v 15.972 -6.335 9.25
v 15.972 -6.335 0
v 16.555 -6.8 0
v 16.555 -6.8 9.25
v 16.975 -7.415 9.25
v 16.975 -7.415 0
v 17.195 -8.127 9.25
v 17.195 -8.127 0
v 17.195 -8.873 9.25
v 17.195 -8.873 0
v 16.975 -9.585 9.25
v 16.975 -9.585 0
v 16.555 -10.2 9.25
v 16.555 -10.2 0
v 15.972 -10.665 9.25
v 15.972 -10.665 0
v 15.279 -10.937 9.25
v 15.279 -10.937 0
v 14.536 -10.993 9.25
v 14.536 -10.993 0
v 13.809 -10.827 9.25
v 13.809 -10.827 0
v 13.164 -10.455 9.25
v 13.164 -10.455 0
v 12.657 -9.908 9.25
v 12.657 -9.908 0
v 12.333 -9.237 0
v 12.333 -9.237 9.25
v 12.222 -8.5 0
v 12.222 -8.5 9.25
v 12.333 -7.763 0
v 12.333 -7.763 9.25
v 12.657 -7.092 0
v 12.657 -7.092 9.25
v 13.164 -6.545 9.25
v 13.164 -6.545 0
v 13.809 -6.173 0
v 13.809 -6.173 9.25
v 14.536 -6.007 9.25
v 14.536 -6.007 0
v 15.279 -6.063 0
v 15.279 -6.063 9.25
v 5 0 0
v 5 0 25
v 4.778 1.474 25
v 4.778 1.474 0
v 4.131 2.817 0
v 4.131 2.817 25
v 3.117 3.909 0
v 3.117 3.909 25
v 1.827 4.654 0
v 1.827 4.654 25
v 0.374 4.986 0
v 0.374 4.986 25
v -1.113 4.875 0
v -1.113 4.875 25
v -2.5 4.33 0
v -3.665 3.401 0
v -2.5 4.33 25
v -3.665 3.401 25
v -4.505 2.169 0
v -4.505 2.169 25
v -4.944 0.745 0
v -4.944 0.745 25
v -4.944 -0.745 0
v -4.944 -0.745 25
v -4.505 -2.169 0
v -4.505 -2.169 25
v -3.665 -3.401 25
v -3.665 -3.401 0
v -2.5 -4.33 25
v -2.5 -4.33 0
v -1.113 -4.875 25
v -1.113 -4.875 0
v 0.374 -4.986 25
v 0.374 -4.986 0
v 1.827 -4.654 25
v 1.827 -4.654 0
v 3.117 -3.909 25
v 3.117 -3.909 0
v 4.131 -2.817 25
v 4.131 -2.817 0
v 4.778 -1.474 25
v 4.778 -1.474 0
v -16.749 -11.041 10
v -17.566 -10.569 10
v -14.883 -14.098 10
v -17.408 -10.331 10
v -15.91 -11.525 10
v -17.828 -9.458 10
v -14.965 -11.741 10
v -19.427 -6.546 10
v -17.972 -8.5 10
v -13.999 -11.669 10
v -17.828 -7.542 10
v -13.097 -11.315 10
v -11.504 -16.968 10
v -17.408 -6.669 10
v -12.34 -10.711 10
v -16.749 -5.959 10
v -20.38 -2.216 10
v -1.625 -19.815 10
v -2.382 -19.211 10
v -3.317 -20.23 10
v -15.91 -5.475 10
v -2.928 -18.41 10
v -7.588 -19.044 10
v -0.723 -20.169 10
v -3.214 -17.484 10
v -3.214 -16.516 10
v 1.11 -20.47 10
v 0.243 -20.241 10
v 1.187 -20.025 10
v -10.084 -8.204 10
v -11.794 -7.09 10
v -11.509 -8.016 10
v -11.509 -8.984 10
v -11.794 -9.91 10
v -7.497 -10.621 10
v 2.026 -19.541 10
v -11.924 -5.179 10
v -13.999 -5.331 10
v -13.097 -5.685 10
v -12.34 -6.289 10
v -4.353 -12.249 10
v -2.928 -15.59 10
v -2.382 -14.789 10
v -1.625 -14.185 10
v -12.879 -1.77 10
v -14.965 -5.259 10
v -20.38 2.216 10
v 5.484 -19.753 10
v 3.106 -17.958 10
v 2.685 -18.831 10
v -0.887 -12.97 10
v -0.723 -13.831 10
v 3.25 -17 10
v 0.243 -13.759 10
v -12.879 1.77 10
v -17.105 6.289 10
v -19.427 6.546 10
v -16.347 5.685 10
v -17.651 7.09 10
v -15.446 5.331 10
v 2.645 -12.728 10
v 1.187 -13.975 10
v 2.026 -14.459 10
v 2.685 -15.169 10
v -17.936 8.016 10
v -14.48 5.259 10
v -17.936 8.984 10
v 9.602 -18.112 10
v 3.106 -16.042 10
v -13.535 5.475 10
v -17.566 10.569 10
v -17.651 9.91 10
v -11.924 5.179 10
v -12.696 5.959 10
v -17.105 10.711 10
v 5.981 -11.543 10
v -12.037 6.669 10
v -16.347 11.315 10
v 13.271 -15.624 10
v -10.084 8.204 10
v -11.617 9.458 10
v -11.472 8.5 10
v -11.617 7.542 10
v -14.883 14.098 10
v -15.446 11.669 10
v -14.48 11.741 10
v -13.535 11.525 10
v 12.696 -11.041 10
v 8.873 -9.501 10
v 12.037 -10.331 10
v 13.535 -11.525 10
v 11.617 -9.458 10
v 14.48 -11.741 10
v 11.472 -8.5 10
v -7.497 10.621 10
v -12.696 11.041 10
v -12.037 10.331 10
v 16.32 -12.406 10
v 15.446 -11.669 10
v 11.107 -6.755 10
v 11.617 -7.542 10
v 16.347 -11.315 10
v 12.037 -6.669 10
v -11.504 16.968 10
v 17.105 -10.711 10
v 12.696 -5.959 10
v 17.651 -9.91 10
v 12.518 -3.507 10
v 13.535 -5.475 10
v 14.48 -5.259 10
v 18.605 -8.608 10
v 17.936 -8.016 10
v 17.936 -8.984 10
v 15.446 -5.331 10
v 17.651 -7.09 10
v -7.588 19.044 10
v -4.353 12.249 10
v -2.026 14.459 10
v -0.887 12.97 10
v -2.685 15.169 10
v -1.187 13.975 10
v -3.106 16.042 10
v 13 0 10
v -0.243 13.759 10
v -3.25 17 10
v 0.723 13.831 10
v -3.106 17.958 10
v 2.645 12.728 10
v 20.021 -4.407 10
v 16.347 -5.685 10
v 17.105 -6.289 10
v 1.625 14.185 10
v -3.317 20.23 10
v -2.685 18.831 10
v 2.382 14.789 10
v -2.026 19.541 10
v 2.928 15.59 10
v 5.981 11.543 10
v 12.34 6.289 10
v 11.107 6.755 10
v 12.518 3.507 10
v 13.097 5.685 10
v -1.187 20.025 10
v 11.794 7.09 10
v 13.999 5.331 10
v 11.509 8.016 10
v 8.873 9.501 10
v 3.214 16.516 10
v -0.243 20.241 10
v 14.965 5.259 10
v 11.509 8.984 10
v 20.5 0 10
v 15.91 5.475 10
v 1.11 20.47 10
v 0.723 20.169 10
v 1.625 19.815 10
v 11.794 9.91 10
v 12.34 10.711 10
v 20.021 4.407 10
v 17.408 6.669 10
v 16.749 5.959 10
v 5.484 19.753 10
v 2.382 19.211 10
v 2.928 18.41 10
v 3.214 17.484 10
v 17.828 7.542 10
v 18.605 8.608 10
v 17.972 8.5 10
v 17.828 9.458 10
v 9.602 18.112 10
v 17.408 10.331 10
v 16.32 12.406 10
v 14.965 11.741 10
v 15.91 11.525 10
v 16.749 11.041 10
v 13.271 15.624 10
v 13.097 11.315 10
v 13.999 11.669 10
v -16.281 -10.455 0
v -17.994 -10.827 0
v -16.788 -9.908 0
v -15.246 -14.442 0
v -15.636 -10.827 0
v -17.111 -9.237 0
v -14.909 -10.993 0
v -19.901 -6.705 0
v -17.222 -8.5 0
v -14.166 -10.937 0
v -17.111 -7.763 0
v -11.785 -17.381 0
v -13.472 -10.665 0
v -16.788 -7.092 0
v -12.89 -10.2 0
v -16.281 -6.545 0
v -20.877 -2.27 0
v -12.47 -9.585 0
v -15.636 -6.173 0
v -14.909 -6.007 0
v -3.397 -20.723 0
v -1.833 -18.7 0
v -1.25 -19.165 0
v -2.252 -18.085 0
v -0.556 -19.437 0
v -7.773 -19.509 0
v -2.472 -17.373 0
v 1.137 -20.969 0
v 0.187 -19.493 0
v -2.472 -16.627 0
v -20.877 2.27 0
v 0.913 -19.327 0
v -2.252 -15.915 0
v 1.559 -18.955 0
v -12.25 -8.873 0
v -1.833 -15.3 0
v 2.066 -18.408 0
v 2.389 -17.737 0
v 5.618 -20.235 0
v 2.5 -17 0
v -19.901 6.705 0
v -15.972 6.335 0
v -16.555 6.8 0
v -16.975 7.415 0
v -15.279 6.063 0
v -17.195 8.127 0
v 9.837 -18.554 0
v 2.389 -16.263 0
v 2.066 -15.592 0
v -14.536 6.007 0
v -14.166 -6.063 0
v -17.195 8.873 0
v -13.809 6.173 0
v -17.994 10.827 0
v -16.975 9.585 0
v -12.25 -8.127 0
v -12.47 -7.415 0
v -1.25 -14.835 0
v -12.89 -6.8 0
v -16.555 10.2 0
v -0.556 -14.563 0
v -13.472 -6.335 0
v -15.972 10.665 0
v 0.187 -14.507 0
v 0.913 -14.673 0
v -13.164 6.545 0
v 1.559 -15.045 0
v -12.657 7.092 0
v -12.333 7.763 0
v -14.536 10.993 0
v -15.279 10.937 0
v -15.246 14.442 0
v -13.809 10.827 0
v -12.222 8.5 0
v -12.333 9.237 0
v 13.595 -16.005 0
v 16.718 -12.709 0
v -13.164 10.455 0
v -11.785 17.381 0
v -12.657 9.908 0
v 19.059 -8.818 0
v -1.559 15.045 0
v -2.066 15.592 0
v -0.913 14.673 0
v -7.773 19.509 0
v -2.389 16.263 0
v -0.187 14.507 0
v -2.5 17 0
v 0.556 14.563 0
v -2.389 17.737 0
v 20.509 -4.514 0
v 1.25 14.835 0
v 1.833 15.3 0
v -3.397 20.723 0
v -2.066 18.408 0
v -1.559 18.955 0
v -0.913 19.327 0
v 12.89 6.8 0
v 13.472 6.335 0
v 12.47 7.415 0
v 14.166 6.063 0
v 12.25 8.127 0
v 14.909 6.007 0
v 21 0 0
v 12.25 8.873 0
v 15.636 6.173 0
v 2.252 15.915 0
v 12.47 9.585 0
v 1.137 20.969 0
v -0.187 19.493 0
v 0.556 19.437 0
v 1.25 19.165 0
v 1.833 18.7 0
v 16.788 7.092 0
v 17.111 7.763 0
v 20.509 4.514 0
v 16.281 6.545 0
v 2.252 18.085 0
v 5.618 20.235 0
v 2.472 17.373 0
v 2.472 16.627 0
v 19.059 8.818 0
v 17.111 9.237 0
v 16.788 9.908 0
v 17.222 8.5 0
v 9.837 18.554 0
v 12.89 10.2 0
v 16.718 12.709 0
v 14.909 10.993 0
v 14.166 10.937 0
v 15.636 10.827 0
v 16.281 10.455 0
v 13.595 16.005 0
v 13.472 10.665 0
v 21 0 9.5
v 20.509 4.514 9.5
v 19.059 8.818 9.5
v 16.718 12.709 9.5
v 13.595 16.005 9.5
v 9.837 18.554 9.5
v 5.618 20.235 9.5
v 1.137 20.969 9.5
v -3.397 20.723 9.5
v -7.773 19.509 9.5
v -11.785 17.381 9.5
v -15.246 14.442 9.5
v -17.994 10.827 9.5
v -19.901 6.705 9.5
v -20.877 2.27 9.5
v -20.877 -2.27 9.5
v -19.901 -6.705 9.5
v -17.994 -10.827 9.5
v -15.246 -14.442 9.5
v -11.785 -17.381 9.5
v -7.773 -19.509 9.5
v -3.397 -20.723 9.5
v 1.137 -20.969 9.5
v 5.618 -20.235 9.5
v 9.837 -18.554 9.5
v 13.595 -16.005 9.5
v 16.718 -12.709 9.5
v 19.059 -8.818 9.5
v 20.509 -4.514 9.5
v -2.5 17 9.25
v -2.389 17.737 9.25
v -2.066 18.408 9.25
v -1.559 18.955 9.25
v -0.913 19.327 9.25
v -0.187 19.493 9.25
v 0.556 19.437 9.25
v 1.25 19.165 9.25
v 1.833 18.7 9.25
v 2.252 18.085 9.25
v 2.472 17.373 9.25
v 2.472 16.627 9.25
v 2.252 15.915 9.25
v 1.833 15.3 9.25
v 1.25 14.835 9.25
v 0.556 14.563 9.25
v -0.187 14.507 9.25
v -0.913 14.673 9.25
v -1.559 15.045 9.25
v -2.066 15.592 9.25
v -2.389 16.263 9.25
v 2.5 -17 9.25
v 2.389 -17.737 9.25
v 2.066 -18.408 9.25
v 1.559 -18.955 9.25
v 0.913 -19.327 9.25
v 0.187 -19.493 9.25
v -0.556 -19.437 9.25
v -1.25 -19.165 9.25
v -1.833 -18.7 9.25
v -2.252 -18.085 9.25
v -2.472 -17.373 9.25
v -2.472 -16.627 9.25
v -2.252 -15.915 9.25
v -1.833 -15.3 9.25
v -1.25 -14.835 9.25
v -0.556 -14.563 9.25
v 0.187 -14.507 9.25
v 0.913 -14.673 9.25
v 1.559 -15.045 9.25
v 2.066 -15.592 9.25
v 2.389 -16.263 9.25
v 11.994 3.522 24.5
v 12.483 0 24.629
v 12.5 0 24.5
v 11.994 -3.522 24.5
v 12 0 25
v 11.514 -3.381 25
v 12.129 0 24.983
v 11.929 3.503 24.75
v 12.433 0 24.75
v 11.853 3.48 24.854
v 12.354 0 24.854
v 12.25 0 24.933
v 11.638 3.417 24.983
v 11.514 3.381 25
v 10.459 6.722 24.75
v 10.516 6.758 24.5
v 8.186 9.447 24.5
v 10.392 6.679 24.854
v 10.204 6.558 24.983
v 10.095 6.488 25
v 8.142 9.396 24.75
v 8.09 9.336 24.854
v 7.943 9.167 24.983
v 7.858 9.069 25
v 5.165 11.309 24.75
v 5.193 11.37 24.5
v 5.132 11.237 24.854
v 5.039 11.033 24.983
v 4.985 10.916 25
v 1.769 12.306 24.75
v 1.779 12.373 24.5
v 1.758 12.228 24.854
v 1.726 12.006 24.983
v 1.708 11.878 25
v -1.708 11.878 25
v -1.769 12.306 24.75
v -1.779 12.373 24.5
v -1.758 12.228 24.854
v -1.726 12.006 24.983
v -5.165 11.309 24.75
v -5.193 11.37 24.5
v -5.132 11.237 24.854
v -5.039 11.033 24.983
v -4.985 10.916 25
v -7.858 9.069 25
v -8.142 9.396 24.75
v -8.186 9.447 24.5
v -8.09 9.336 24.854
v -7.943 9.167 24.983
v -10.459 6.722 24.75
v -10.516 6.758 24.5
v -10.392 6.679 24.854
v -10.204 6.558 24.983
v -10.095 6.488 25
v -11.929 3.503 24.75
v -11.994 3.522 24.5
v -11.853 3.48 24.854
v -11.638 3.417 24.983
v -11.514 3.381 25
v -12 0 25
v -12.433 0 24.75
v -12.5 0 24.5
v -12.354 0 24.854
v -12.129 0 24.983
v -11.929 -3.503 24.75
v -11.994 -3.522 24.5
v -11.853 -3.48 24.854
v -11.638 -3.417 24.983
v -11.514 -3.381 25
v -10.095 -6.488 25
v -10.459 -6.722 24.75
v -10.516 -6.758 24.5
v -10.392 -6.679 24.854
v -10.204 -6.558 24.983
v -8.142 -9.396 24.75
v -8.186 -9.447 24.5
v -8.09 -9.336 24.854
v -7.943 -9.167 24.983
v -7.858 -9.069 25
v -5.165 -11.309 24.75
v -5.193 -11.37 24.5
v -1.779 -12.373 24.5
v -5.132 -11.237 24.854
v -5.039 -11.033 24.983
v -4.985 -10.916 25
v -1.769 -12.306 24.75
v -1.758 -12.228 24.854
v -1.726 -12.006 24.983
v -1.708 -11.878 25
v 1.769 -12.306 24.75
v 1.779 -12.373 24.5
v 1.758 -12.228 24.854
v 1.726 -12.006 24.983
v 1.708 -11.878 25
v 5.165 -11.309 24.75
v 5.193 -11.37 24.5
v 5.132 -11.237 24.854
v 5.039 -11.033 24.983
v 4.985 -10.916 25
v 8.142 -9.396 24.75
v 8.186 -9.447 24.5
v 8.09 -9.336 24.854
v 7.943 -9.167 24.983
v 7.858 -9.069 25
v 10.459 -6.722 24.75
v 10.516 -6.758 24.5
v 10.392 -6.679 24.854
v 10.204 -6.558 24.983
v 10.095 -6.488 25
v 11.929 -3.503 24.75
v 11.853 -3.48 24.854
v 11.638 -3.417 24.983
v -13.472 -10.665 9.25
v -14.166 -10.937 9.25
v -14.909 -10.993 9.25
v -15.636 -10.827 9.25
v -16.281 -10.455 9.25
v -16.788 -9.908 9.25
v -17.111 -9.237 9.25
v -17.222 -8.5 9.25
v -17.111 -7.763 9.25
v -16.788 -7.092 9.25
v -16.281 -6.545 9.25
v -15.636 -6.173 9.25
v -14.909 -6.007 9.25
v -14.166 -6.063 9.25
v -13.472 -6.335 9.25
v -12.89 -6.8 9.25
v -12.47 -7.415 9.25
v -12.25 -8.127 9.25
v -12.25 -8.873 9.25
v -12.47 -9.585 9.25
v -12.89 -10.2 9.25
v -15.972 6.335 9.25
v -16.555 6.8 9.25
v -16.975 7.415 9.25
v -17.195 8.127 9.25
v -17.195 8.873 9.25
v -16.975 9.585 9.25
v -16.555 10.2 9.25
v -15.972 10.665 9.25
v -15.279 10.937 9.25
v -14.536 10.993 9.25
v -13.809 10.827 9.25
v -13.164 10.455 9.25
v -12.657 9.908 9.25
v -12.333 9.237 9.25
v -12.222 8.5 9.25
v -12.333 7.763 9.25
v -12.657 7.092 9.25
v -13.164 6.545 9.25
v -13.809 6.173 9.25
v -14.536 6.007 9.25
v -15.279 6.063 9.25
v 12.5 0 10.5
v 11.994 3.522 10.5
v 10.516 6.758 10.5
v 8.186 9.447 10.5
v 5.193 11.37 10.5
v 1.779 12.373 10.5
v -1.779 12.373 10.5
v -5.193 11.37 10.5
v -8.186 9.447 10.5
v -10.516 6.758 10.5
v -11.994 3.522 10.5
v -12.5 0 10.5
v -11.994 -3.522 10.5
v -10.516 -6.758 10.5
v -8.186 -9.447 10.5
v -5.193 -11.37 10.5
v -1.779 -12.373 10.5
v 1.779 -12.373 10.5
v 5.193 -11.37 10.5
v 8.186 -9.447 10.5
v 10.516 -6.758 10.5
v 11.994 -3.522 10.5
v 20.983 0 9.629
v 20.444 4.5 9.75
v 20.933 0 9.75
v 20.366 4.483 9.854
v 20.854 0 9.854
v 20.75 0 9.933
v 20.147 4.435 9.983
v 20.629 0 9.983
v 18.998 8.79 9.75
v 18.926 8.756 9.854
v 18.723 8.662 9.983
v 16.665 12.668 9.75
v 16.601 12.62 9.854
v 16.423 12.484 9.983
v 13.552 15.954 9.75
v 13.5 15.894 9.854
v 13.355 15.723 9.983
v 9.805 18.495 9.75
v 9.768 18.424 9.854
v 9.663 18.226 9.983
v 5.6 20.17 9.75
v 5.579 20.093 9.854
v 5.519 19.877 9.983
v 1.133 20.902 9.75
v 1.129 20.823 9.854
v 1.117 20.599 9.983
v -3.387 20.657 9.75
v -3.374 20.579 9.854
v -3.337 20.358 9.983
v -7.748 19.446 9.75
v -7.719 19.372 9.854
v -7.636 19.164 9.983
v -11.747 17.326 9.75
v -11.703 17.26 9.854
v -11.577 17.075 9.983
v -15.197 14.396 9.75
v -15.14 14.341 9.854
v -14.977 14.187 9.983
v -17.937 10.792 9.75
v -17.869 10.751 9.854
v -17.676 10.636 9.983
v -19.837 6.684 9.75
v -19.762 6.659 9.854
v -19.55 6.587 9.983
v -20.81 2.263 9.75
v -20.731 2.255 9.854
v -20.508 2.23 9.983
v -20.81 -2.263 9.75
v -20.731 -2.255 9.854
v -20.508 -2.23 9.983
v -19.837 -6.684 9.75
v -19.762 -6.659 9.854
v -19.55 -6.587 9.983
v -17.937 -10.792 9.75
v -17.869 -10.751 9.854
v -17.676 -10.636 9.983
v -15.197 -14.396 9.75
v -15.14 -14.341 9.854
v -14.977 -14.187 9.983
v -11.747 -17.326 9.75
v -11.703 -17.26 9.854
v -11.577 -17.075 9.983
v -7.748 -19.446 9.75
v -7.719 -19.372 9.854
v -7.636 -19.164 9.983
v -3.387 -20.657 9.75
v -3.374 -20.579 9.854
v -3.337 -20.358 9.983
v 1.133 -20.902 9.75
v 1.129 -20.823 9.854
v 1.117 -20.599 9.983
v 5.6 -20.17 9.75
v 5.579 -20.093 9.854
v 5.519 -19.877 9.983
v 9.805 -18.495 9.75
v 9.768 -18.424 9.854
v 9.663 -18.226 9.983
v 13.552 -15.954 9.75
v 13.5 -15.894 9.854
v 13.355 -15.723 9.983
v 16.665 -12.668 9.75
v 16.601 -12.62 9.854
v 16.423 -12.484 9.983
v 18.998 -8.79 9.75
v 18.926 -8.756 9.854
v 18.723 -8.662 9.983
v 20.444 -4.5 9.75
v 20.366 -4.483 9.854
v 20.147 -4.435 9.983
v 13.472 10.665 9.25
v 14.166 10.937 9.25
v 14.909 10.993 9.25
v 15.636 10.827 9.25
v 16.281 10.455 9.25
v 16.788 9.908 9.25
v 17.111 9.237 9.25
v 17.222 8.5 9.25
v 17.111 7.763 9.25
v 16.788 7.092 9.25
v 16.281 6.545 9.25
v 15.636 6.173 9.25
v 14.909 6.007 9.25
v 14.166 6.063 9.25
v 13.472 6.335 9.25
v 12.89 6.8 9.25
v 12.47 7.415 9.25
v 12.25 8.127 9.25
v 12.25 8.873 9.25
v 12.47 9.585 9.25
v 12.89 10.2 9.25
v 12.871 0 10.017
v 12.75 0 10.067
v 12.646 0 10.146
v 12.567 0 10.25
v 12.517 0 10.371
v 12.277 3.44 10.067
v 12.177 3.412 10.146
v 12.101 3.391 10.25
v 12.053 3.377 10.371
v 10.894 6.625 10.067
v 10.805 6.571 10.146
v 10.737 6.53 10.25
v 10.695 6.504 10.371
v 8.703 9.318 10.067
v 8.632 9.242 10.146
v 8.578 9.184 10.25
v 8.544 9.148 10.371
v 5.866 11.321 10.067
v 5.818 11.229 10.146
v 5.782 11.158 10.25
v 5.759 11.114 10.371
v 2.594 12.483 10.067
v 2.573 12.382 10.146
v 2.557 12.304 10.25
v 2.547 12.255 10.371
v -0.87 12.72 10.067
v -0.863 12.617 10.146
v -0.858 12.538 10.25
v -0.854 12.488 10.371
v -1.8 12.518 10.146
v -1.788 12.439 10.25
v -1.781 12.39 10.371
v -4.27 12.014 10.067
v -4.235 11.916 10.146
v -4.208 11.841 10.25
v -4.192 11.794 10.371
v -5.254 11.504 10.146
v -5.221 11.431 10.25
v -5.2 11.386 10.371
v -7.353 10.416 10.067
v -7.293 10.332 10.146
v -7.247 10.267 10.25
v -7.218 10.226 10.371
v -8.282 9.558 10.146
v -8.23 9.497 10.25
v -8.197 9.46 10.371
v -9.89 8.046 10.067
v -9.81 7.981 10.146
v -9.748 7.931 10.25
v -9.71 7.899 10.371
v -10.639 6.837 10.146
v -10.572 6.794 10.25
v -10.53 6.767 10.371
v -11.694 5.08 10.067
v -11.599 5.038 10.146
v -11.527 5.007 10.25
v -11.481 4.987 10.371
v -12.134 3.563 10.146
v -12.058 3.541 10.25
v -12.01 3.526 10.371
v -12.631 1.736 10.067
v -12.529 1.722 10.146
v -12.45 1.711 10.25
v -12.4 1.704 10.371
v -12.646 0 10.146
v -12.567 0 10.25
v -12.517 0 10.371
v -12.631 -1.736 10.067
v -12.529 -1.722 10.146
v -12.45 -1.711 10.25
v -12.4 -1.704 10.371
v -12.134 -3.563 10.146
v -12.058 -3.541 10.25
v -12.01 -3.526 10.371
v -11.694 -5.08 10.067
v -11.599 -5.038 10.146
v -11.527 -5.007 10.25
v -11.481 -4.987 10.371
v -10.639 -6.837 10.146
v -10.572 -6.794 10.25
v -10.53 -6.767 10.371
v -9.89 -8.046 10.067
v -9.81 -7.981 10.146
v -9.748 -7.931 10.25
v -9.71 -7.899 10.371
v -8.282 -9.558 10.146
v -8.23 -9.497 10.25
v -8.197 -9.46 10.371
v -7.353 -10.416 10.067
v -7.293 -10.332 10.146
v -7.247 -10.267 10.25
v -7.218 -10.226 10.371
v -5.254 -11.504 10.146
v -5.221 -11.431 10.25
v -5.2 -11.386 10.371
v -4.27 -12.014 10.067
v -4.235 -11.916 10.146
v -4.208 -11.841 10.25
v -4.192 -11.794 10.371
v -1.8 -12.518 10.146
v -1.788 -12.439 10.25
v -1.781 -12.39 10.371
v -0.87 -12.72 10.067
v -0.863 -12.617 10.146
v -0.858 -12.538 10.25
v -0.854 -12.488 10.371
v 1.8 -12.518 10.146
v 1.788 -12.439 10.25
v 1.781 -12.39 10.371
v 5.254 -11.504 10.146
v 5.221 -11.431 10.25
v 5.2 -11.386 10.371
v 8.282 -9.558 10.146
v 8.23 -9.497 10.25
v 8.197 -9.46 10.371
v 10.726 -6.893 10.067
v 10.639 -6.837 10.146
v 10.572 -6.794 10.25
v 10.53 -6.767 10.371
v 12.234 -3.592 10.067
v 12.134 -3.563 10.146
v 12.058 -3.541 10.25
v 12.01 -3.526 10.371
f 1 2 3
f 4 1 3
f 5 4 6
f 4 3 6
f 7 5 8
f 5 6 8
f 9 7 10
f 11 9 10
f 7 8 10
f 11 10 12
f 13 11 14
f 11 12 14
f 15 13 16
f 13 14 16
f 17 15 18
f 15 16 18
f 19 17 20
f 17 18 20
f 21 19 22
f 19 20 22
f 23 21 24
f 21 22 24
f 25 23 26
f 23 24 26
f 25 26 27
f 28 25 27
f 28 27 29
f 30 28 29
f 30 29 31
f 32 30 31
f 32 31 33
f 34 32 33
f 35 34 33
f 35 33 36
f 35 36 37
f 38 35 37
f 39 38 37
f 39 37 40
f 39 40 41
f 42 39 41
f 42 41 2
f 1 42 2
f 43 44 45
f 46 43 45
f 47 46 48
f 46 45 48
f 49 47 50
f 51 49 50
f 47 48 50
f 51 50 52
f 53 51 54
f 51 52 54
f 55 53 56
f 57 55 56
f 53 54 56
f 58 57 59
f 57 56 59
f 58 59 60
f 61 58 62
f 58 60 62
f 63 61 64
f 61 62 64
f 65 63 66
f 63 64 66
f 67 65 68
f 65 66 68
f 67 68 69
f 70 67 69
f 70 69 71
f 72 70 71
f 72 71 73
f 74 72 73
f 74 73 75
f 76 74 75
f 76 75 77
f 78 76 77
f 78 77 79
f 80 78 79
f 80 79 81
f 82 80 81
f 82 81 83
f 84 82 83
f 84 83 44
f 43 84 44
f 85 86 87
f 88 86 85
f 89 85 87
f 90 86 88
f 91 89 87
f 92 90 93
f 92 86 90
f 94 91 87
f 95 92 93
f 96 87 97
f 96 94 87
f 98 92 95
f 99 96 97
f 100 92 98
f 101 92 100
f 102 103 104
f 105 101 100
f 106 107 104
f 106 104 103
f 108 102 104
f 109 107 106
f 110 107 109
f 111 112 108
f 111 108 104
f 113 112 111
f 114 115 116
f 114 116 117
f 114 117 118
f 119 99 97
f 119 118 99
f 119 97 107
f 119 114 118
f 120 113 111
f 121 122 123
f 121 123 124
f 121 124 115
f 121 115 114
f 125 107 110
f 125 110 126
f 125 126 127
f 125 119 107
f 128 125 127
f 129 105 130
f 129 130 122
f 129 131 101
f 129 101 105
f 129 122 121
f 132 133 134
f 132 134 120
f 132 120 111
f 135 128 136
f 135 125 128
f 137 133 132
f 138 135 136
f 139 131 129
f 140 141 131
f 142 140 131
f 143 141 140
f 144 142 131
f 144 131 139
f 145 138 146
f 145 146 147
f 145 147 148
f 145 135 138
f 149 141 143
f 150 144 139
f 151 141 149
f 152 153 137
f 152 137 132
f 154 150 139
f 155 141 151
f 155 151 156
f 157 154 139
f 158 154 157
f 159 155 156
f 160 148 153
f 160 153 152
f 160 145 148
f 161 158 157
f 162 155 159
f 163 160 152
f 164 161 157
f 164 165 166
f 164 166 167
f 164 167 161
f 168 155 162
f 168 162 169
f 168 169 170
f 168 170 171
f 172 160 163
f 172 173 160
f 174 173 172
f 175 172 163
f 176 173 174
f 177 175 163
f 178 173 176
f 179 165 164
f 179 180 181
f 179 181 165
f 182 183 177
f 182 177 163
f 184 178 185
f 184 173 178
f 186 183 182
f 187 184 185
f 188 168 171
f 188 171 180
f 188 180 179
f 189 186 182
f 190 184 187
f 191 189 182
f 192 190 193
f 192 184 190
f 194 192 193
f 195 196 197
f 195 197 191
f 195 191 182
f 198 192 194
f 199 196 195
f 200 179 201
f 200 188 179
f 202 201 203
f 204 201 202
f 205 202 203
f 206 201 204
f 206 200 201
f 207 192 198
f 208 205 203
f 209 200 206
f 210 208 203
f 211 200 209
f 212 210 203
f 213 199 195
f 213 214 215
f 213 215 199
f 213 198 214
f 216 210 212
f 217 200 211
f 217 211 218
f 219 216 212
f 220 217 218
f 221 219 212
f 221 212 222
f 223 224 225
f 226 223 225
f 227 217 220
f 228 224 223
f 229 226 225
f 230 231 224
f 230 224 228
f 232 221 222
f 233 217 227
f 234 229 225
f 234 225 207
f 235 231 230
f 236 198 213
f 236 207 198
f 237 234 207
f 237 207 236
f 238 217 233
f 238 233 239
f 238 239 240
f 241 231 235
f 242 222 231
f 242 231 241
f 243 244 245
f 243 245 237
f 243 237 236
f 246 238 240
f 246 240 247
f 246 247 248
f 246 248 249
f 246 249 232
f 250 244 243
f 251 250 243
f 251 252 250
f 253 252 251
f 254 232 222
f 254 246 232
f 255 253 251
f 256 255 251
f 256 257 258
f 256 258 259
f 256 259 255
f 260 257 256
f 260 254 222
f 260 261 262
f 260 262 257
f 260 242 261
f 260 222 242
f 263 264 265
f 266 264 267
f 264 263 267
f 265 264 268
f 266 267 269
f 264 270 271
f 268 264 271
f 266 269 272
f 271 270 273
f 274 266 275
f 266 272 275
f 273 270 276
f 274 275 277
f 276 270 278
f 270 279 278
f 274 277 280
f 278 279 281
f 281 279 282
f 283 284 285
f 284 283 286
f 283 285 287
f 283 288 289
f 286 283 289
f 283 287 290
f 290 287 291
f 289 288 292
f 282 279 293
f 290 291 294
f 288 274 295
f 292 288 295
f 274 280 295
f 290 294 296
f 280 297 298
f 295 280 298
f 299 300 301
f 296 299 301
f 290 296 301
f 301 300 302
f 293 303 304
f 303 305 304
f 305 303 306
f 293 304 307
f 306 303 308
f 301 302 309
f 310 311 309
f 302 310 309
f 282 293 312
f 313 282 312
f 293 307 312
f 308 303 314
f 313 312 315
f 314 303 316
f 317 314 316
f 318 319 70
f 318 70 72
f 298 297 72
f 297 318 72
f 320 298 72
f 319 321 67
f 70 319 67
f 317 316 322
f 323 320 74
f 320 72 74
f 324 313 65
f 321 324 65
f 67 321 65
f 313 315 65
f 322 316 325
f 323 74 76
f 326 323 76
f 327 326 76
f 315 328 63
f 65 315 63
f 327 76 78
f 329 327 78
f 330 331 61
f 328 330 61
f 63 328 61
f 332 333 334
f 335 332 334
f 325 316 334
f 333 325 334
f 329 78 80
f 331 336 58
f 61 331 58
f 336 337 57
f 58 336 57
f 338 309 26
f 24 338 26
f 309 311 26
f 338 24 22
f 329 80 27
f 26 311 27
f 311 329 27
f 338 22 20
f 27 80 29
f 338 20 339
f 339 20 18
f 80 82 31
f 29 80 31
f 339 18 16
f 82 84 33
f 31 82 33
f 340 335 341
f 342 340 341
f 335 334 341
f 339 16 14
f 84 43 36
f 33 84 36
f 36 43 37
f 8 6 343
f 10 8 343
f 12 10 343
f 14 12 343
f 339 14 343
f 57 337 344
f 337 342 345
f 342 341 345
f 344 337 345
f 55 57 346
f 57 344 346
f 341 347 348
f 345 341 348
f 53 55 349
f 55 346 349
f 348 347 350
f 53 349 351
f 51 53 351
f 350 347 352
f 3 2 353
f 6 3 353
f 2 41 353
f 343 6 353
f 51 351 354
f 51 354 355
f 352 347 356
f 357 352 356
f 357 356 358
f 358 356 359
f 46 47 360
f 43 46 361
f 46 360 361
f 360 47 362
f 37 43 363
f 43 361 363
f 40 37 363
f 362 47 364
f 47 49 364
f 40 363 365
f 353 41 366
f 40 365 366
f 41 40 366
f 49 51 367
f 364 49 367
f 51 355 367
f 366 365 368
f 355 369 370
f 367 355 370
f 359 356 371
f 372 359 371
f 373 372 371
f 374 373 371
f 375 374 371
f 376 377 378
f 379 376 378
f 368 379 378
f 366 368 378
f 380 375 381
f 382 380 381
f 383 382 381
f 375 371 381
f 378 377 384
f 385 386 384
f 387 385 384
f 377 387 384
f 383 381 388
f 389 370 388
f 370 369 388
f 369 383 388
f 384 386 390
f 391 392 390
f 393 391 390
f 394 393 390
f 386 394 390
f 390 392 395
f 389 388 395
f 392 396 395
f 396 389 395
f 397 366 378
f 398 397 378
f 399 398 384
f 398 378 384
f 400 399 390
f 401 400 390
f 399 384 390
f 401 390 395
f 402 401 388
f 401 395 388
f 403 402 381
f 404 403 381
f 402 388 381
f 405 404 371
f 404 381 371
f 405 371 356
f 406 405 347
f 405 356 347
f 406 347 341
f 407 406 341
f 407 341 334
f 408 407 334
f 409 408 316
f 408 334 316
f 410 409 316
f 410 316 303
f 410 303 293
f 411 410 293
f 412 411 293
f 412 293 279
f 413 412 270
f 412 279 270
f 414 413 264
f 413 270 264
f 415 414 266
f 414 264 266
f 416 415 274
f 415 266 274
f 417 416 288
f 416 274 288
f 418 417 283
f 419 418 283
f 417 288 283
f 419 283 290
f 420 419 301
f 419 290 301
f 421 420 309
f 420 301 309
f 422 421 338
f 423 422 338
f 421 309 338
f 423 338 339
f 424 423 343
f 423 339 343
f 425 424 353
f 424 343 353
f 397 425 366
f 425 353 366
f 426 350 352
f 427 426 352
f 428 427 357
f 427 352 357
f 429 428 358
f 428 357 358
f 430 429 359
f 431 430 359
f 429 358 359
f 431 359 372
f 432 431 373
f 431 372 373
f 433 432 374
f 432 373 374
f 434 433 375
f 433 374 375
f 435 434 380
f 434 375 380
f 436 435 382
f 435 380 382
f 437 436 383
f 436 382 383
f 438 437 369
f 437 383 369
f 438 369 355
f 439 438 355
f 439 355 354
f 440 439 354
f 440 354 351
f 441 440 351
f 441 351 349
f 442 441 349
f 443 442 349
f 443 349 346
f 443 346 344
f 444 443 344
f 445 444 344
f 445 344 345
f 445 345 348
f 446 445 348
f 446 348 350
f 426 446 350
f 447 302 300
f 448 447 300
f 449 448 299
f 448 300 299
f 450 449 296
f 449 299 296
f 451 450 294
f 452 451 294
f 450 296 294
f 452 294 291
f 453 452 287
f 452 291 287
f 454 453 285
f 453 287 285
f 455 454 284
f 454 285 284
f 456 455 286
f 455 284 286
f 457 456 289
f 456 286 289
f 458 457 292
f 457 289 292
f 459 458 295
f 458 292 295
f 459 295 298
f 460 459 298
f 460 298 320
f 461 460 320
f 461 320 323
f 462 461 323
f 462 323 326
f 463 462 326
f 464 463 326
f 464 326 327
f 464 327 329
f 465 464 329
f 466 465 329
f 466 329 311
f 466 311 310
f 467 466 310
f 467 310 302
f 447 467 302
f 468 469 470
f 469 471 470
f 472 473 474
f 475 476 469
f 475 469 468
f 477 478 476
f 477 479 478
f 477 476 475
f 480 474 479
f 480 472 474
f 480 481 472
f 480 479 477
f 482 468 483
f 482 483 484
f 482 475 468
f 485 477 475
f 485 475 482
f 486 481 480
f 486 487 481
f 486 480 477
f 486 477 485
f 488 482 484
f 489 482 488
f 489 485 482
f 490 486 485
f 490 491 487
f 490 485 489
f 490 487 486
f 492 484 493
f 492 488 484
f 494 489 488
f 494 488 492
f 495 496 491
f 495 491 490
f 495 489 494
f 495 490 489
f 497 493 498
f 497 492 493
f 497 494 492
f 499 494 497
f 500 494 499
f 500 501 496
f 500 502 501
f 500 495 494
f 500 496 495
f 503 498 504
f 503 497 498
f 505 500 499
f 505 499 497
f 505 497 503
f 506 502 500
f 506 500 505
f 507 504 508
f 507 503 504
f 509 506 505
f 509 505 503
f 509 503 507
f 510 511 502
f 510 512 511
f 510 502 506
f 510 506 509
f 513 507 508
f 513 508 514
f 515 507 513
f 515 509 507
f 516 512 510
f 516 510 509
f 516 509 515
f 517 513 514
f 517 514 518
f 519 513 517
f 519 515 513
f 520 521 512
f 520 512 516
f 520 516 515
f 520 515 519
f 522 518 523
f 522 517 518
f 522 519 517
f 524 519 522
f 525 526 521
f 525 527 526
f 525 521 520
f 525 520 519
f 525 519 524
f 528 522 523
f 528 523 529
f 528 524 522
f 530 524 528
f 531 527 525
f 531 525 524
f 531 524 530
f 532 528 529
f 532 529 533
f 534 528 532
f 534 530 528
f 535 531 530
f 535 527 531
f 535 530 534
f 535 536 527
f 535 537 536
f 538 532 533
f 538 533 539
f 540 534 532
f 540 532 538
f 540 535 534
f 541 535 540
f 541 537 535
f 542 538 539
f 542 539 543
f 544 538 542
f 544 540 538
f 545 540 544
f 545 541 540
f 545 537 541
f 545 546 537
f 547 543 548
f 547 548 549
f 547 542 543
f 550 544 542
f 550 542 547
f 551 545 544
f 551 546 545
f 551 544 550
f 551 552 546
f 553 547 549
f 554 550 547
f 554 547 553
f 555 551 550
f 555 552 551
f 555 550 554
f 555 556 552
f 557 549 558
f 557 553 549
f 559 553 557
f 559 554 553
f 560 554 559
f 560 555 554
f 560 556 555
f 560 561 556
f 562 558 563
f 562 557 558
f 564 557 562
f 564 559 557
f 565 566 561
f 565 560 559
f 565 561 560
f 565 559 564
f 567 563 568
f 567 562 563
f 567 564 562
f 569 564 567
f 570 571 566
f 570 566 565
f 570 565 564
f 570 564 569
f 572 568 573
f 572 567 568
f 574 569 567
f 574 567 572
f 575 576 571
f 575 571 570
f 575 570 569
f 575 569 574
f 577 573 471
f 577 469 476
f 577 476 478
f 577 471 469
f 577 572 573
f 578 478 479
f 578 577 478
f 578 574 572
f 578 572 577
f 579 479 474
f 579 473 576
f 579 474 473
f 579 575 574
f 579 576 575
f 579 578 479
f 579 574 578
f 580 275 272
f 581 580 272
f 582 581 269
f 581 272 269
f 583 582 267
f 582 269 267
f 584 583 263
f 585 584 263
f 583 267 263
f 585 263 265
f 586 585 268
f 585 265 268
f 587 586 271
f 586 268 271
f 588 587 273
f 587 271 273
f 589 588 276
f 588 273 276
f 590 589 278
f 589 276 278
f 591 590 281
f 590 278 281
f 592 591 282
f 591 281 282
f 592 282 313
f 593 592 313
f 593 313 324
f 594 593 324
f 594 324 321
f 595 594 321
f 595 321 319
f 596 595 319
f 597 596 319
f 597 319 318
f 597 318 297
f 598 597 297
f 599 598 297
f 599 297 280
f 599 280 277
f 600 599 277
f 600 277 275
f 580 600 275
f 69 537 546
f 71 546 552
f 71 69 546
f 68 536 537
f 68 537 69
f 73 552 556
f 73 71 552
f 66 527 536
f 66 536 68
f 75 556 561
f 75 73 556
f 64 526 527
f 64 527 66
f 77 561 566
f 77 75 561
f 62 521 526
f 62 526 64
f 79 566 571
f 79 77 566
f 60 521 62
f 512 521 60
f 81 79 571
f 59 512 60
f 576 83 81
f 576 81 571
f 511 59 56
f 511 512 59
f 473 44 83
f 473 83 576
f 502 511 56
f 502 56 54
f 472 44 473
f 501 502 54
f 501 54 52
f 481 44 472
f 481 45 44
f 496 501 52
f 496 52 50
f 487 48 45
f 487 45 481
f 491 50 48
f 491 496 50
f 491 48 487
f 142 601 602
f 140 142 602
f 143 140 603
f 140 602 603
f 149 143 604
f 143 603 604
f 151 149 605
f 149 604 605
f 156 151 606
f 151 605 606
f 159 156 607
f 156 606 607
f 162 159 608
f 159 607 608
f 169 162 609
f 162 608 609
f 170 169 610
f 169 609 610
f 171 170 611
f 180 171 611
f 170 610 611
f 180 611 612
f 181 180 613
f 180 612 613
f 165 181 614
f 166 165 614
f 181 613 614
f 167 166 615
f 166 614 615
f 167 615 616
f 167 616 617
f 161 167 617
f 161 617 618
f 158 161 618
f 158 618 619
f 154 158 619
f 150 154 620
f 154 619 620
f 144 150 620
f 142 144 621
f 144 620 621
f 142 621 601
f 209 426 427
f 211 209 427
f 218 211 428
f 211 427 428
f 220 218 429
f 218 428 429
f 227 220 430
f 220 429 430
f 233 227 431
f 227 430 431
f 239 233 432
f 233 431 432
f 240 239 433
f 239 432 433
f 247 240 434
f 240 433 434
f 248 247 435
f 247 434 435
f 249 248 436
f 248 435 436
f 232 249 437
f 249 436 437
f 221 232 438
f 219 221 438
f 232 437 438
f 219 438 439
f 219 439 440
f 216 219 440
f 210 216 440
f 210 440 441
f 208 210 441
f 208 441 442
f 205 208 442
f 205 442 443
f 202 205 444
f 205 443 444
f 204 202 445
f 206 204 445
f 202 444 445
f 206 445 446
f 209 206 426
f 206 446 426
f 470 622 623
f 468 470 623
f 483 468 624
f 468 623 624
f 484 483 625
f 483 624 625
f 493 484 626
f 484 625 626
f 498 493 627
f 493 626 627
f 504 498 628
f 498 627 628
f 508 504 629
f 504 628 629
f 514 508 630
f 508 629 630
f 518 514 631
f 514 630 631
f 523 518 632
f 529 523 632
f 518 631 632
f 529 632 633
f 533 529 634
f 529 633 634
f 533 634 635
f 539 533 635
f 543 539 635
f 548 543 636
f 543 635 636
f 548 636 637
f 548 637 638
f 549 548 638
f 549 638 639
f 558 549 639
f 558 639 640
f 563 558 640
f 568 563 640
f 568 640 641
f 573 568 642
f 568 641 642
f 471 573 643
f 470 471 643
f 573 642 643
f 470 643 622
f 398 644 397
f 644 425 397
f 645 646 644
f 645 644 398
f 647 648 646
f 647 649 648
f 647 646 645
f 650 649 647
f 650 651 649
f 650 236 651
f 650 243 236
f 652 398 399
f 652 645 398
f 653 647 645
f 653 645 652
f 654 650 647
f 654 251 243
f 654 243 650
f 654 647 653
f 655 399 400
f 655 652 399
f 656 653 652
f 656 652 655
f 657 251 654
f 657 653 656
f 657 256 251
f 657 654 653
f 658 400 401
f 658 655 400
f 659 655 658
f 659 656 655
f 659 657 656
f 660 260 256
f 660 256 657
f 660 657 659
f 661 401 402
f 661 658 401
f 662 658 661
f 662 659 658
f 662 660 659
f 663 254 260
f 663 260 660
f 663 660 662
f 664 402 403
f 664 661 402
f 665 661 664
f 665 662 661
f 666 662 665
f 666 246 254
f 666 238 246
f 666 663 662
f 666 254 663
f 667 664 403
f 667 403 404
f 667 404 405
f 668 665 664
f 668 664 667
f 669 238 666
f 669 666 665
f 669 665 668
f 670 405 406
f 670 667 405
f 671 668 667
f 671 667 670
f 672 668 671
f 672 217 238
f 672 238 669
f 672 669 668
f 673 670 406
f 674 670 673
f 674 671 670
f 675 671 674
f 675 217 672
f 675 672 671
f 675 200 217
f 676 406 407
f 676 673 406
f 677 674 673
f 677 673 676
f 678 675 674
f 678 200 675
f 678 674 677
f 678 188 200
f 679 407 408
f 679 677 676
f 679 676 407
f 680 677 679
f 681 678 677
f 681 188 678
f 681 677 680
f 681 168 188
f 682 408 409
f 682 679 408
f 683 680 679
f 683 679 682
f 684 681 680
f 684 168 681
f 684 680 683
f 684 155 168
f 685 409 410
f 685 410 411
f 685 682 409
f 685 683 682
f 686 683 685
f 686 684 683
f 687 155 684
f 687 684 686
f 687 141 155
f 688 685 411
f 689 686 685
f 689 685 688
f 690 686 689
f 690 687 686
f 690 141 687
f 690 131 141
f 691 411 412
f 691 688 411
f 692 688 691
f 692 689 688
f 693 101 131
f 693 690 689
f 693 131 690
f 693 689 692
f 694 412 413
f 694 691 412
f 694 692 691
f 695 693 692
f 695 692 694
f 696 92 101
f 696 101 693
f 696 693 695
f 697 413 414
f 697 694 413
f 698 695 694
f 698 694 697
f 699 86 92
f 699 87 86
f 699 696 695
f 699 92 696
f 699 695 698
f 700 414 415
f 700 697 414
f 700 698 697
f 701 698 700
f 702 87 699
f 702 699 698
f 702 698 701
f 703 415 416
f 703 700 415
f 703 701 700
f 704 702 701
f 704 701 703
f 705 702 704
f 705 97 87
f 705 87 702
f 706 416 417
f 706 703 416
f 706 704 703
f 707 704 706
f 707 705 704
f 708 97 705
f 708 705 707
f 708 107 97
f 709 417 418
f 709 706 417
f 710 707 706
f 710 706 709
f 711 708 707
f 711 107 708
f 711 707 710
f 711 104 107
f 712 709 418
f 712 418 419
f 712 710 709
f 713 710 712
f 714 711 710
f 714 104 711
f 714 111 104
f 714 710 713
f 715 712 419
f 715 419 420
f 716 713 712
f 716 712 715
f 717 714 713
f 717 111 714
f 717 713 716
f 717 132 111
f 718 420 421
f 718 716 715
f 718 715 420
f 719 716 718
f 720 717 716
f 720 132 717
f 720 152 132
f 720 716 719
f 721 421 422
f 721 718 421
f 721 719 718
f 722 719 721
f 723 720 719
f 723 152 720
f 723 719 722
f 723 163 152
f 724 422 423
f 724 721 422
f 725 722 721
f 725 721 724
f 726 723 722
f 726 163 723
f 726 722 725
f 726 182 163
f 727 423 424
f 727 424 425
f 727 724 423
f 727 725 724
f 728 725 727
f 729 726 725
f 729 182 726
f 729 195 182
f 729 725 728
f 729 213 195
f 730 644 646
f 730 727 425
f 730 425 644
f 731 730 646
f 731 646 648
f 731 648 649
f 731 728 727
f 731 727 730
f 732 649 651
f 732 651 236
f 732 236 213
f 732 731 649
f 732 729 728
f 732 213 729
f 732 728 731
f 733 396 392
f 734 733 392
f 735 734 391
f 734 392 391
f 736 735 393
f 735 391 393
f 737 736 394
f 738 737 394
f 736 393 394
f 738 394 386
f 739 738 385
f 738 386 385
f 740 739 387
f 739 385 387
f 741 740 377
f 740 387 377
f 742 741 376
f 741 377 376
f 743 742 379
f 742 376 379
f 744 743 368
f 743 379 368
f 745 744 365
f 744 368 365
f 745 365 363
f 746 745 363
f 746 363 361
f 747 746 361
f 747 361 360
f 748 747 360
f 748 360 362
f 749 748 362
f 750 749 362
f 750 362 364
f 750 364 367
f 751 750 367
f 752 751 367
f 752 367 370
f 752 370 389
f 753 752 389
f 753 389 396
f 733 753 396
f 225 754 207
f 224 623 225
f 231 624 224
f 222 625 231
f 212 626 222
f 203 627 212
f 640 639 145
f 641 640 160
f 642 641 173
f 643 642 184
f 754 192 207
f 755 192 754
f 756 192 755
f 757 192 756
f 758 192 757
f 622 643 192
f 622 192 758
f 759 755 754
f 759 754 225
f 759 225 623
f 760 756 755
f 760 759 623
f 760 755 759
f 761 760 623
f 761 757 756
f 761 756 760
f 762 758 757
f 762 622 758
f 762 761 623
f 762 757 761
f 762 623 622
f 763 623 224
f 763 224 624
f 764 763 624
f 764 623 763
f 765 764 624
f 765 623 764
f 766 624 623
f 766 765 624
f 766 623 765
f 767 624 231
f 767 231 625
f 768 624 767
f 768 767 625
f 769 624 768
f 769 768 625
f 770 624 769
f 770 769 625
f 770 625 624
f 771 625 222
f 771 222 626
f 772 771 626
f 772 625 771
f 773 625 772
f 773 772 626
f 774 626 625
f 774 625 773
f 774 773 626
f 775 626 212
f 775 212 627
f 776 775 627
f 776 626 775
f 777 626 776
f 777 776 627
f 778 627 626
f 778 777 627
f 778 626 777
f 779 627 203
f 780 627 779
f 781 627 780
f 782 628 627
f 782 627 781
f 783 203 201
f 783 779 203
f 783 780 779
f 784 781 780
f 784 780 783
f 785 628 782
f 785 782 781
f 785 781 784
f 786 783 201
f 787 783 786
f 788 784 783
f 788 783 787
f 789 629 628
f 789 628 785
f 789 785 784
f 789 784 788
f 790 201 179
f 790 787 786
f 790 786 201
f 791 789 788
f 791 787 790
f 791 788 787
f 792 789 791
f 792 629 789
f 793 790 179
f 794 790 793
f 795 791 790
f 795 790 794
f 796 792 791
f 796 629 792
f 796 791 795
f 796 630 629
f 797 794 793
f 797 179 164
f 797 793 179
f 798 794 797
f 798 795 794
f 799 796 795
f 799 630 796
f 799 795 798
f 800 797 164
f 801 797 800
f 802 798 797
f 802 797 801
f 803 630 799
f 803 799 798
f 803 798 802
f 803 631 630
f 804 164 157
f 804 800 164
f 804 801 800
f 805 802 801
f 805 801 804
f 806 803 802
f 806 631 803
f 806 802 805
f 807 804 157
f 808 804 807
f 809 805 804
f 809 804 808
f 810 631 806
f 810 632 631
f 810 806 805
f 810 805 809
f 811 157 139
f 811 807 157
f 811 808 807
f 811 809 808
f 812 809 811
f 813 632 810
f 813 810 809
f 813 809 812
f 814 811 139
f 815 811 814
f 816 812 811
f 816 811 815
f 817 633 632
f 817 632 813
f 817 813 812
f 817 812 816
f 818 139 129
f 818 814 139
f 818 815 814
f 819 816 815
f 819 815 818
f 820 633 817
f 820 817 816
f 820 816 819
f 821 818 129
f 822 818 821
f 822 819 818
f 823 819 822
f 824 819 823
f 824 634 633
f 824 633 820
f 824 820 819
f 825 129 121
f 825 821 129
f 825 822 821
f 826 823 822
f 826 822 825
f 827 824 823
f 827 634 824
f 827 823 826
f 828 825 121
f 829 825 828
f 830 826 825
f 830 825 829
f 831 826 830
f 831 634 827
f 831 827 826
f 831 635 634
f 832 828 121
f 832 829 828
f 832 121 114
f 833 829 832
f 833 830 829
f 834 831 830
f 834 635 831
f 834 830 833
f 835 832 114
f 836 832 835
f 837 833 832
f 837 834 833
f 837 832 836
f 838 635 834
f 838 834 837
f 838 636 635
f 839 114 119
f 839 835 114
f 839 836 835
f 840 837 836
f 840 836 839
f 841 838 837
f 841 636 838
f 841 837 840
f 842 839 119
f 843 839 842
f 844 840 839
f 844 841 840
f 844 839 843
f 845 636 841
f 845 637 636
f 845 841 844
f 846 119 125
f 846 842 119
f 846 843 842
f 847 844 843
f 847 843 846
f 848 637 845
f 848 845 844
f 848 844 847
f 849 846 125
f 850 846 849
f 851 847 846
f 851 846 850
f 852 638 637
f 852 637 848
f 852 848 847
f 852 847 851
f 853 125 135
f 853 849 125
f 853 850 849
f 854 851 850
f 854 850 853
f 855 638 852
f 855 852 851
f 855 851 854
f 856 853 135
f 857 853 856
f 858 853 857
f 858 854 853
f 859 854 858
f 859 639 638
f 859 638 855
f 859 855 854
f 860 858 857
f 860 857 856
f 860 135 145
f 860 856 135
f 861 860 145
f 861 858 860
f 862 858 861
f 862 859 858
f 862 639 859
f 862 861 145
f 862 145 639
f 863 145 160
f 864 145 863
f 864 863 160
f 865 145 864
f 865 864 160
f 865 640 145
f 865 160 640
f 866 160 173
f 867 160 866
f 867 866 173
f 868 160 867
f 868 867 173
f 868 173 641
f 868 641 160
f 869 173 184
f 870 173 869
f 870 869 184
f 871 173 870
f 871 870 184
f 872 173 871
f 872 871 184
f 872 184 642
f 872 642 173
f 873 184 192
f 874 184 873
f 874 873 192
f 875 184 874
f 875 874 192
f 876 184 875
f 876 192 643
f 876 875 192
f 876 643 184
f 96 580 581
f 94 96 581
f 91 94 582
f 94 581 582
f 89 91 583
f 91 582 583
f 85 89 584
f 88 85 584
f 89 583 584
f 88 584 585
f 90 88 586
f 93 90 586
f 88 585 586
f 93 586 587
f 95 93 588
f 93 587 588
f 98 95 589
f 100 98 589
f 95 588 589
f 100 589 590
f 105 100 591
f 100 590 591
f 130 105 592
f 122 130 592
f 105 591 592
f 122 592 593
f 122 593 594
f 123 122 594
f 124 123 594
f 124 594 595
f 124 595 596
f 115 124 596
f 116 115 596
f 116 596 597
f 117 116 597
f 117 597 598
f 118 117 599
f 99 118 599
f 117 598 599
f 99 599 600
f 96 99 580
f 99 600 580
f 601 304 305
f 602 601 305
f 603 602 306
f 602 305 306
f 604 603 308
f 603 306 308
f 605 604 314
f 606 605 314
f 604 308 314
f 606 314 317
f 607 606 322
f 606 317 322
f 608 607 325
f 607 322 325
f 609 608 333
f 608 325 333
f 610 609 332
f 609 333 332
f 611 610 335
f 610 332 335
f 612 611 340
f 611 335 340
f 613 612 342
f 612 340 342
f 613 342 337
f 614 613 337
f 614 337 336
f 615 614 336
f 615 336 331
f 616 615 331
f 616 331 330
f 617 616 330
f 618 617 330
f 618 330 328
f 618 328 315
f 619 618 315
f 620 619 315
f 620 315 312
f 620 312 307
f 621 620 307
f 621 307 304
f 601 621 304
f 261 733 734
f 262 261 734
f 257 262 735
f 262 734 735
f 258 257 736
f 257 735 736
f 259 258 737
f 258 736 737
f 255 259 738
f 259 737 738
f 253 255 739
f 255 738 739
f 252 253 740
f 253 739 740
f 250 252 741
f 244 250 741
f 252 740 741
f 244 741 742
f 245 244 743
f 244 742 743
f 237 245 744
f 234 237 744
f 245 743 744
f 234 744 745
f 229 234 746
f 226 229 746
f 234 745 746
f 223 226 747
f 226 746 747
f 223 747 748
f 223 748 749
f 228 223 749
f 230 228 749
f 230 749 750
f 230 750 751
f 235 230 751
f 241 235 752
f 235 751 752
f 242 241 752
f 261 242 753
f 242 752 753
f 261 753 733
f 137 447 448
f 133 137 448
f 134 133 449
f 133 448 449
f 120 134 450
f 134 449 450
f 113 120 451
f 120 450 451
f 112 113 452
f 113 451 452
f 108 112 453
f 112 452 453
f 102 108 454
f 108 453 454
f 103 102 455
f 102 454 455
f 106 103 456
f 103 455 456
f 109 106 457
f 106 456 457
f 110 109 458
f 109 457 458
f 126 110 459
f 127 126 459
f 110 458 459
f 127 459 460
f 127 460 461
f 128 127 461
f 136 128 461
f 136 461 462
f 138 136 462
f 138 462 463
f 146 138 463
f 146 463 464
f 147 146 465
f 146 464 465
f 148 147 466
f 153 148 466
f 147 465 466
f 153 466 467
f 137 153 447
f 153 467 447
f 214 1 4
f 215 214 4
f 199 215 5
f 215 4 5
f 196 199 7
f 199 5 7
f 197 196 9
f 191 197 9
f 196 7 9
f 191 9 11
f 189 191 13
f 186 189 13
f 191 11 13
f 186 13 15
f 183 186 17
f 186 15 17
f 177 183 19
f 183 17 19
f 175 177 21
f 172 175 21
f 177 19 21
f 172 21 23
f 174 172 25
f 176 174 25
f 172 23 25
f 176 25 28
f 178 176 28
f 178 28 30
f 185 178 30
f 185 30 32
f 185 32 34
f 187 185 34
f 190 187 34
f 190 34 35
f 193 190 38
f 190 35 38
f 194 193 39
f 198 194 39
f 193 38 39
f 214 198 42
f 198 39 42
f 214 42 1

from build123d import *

# Parameters (mm, degrees)
SKETCH1_R                    = 21
BOSS_EXTRUDE1_DEPTH          = 10
SKETCH2_R                    = 12.5
BOSS_EXTRUDE2_DEPTH          = 15
SKETCH3_R                    = 5
CUT_EXTRUDE1_DEPTH           = 39.820097888
SKETCH4_R                    = 2.5
CUT_EXTRUDE2_DEPTH           = 39.820097888
FILLET1_R                    = 0.5
CHAMFER2_SIZE                = 0.75
CIRPATTERN2_COUNT            = 6
CHAMFER2_OF_CIRPATTERN2_SIZE = 0.75


with BuildPart() as part:
    # Sketch1 → Boss-Extrude1 (new body)
    with BuildSketch(Plane.XY):
        Circle(SKETCH1_R)
    extrude(amount=BOSS_EXTRUDE1_DEPTH)

    # Sketch2 → Boss-Extrude2 (add)
    with BuildSketch(Plane.XY.offset(10)):
        Circle(SKETCH2_R)
    extrude(amount=BOSS_EXTRUDE2_DEPTH)

    # Sketch3 → Cut-Extrude1 (cut, through all)
    with BuildSketch(Plane.XY.offset(25)):
        Circle(SKETCH3_R)
    extrude(amount=-CUT_EXTRUDE1_DEPTH, mode=Mode.SUBTRACT)

    # Sketch4 → Cut-Extrude2 (cut, through all)
    with BuildSketch(Plane(origin=(0, 0, 0), x_dir=(-1, 0, 0), z_dir=(0, 0, -1))):
        with Locations((0, 17)):
            Circle(SKETCH4_R)
    cut_extrude2 = extrude(amount=-CUT_EXTRUDE2_DEPTH, mode=Mode.SUBTRACT)

    # Fillet1
    fillet1_edges = [part.edges().sort_by_distance(p)[0] for p in [
        (-21, 0, 10),
        (-12.5, 0, 10),
        (-12.5, 0, 25),
    ]]
    fillet(fillet1_edges, radius=FILLET1_R)

    # Chamfer2
    chamfer2_edges = [part.edges().sort_by_distance(p)[0] for p in [
        (2.5, 17, 10),
    ]]
    chamfer(chamfer2_edges, length=CHAMFER2_SIZE)

    # CirPattern2: Cut-Extrude2 ×6 about axis
    cirpattern2_axis = Axis((0, 0, 0), (0, 0, 1))
    for i in range(1, CIRPATTERN2_COUNT):
        add(cut_extrude2.rotate(cirpattern2_axis, i * 360 / CIRPATTERN2_COUNT), mode=Mode.SUBTRACT)

    # Chamfer2 of CirPattern2
    chamfer2_of_cirpattern2_edges = [part.edges().sort_by_distance(p)[0] for p in [
        (-13.472431864, 10.665063509, 10),
        (-15.972431864, -6.334936491, 10),
        (-2.5, -17, 10),
        (13.472431864, -10.665063509, 10),
        (15.972431864, 6.334936491, 10),
    ]]
    chamfer(chamfer2_of_cirpattern2_edges, length=CHAMFER2_OF_CIRPATTERN2_SIZE)


solid = part.part
